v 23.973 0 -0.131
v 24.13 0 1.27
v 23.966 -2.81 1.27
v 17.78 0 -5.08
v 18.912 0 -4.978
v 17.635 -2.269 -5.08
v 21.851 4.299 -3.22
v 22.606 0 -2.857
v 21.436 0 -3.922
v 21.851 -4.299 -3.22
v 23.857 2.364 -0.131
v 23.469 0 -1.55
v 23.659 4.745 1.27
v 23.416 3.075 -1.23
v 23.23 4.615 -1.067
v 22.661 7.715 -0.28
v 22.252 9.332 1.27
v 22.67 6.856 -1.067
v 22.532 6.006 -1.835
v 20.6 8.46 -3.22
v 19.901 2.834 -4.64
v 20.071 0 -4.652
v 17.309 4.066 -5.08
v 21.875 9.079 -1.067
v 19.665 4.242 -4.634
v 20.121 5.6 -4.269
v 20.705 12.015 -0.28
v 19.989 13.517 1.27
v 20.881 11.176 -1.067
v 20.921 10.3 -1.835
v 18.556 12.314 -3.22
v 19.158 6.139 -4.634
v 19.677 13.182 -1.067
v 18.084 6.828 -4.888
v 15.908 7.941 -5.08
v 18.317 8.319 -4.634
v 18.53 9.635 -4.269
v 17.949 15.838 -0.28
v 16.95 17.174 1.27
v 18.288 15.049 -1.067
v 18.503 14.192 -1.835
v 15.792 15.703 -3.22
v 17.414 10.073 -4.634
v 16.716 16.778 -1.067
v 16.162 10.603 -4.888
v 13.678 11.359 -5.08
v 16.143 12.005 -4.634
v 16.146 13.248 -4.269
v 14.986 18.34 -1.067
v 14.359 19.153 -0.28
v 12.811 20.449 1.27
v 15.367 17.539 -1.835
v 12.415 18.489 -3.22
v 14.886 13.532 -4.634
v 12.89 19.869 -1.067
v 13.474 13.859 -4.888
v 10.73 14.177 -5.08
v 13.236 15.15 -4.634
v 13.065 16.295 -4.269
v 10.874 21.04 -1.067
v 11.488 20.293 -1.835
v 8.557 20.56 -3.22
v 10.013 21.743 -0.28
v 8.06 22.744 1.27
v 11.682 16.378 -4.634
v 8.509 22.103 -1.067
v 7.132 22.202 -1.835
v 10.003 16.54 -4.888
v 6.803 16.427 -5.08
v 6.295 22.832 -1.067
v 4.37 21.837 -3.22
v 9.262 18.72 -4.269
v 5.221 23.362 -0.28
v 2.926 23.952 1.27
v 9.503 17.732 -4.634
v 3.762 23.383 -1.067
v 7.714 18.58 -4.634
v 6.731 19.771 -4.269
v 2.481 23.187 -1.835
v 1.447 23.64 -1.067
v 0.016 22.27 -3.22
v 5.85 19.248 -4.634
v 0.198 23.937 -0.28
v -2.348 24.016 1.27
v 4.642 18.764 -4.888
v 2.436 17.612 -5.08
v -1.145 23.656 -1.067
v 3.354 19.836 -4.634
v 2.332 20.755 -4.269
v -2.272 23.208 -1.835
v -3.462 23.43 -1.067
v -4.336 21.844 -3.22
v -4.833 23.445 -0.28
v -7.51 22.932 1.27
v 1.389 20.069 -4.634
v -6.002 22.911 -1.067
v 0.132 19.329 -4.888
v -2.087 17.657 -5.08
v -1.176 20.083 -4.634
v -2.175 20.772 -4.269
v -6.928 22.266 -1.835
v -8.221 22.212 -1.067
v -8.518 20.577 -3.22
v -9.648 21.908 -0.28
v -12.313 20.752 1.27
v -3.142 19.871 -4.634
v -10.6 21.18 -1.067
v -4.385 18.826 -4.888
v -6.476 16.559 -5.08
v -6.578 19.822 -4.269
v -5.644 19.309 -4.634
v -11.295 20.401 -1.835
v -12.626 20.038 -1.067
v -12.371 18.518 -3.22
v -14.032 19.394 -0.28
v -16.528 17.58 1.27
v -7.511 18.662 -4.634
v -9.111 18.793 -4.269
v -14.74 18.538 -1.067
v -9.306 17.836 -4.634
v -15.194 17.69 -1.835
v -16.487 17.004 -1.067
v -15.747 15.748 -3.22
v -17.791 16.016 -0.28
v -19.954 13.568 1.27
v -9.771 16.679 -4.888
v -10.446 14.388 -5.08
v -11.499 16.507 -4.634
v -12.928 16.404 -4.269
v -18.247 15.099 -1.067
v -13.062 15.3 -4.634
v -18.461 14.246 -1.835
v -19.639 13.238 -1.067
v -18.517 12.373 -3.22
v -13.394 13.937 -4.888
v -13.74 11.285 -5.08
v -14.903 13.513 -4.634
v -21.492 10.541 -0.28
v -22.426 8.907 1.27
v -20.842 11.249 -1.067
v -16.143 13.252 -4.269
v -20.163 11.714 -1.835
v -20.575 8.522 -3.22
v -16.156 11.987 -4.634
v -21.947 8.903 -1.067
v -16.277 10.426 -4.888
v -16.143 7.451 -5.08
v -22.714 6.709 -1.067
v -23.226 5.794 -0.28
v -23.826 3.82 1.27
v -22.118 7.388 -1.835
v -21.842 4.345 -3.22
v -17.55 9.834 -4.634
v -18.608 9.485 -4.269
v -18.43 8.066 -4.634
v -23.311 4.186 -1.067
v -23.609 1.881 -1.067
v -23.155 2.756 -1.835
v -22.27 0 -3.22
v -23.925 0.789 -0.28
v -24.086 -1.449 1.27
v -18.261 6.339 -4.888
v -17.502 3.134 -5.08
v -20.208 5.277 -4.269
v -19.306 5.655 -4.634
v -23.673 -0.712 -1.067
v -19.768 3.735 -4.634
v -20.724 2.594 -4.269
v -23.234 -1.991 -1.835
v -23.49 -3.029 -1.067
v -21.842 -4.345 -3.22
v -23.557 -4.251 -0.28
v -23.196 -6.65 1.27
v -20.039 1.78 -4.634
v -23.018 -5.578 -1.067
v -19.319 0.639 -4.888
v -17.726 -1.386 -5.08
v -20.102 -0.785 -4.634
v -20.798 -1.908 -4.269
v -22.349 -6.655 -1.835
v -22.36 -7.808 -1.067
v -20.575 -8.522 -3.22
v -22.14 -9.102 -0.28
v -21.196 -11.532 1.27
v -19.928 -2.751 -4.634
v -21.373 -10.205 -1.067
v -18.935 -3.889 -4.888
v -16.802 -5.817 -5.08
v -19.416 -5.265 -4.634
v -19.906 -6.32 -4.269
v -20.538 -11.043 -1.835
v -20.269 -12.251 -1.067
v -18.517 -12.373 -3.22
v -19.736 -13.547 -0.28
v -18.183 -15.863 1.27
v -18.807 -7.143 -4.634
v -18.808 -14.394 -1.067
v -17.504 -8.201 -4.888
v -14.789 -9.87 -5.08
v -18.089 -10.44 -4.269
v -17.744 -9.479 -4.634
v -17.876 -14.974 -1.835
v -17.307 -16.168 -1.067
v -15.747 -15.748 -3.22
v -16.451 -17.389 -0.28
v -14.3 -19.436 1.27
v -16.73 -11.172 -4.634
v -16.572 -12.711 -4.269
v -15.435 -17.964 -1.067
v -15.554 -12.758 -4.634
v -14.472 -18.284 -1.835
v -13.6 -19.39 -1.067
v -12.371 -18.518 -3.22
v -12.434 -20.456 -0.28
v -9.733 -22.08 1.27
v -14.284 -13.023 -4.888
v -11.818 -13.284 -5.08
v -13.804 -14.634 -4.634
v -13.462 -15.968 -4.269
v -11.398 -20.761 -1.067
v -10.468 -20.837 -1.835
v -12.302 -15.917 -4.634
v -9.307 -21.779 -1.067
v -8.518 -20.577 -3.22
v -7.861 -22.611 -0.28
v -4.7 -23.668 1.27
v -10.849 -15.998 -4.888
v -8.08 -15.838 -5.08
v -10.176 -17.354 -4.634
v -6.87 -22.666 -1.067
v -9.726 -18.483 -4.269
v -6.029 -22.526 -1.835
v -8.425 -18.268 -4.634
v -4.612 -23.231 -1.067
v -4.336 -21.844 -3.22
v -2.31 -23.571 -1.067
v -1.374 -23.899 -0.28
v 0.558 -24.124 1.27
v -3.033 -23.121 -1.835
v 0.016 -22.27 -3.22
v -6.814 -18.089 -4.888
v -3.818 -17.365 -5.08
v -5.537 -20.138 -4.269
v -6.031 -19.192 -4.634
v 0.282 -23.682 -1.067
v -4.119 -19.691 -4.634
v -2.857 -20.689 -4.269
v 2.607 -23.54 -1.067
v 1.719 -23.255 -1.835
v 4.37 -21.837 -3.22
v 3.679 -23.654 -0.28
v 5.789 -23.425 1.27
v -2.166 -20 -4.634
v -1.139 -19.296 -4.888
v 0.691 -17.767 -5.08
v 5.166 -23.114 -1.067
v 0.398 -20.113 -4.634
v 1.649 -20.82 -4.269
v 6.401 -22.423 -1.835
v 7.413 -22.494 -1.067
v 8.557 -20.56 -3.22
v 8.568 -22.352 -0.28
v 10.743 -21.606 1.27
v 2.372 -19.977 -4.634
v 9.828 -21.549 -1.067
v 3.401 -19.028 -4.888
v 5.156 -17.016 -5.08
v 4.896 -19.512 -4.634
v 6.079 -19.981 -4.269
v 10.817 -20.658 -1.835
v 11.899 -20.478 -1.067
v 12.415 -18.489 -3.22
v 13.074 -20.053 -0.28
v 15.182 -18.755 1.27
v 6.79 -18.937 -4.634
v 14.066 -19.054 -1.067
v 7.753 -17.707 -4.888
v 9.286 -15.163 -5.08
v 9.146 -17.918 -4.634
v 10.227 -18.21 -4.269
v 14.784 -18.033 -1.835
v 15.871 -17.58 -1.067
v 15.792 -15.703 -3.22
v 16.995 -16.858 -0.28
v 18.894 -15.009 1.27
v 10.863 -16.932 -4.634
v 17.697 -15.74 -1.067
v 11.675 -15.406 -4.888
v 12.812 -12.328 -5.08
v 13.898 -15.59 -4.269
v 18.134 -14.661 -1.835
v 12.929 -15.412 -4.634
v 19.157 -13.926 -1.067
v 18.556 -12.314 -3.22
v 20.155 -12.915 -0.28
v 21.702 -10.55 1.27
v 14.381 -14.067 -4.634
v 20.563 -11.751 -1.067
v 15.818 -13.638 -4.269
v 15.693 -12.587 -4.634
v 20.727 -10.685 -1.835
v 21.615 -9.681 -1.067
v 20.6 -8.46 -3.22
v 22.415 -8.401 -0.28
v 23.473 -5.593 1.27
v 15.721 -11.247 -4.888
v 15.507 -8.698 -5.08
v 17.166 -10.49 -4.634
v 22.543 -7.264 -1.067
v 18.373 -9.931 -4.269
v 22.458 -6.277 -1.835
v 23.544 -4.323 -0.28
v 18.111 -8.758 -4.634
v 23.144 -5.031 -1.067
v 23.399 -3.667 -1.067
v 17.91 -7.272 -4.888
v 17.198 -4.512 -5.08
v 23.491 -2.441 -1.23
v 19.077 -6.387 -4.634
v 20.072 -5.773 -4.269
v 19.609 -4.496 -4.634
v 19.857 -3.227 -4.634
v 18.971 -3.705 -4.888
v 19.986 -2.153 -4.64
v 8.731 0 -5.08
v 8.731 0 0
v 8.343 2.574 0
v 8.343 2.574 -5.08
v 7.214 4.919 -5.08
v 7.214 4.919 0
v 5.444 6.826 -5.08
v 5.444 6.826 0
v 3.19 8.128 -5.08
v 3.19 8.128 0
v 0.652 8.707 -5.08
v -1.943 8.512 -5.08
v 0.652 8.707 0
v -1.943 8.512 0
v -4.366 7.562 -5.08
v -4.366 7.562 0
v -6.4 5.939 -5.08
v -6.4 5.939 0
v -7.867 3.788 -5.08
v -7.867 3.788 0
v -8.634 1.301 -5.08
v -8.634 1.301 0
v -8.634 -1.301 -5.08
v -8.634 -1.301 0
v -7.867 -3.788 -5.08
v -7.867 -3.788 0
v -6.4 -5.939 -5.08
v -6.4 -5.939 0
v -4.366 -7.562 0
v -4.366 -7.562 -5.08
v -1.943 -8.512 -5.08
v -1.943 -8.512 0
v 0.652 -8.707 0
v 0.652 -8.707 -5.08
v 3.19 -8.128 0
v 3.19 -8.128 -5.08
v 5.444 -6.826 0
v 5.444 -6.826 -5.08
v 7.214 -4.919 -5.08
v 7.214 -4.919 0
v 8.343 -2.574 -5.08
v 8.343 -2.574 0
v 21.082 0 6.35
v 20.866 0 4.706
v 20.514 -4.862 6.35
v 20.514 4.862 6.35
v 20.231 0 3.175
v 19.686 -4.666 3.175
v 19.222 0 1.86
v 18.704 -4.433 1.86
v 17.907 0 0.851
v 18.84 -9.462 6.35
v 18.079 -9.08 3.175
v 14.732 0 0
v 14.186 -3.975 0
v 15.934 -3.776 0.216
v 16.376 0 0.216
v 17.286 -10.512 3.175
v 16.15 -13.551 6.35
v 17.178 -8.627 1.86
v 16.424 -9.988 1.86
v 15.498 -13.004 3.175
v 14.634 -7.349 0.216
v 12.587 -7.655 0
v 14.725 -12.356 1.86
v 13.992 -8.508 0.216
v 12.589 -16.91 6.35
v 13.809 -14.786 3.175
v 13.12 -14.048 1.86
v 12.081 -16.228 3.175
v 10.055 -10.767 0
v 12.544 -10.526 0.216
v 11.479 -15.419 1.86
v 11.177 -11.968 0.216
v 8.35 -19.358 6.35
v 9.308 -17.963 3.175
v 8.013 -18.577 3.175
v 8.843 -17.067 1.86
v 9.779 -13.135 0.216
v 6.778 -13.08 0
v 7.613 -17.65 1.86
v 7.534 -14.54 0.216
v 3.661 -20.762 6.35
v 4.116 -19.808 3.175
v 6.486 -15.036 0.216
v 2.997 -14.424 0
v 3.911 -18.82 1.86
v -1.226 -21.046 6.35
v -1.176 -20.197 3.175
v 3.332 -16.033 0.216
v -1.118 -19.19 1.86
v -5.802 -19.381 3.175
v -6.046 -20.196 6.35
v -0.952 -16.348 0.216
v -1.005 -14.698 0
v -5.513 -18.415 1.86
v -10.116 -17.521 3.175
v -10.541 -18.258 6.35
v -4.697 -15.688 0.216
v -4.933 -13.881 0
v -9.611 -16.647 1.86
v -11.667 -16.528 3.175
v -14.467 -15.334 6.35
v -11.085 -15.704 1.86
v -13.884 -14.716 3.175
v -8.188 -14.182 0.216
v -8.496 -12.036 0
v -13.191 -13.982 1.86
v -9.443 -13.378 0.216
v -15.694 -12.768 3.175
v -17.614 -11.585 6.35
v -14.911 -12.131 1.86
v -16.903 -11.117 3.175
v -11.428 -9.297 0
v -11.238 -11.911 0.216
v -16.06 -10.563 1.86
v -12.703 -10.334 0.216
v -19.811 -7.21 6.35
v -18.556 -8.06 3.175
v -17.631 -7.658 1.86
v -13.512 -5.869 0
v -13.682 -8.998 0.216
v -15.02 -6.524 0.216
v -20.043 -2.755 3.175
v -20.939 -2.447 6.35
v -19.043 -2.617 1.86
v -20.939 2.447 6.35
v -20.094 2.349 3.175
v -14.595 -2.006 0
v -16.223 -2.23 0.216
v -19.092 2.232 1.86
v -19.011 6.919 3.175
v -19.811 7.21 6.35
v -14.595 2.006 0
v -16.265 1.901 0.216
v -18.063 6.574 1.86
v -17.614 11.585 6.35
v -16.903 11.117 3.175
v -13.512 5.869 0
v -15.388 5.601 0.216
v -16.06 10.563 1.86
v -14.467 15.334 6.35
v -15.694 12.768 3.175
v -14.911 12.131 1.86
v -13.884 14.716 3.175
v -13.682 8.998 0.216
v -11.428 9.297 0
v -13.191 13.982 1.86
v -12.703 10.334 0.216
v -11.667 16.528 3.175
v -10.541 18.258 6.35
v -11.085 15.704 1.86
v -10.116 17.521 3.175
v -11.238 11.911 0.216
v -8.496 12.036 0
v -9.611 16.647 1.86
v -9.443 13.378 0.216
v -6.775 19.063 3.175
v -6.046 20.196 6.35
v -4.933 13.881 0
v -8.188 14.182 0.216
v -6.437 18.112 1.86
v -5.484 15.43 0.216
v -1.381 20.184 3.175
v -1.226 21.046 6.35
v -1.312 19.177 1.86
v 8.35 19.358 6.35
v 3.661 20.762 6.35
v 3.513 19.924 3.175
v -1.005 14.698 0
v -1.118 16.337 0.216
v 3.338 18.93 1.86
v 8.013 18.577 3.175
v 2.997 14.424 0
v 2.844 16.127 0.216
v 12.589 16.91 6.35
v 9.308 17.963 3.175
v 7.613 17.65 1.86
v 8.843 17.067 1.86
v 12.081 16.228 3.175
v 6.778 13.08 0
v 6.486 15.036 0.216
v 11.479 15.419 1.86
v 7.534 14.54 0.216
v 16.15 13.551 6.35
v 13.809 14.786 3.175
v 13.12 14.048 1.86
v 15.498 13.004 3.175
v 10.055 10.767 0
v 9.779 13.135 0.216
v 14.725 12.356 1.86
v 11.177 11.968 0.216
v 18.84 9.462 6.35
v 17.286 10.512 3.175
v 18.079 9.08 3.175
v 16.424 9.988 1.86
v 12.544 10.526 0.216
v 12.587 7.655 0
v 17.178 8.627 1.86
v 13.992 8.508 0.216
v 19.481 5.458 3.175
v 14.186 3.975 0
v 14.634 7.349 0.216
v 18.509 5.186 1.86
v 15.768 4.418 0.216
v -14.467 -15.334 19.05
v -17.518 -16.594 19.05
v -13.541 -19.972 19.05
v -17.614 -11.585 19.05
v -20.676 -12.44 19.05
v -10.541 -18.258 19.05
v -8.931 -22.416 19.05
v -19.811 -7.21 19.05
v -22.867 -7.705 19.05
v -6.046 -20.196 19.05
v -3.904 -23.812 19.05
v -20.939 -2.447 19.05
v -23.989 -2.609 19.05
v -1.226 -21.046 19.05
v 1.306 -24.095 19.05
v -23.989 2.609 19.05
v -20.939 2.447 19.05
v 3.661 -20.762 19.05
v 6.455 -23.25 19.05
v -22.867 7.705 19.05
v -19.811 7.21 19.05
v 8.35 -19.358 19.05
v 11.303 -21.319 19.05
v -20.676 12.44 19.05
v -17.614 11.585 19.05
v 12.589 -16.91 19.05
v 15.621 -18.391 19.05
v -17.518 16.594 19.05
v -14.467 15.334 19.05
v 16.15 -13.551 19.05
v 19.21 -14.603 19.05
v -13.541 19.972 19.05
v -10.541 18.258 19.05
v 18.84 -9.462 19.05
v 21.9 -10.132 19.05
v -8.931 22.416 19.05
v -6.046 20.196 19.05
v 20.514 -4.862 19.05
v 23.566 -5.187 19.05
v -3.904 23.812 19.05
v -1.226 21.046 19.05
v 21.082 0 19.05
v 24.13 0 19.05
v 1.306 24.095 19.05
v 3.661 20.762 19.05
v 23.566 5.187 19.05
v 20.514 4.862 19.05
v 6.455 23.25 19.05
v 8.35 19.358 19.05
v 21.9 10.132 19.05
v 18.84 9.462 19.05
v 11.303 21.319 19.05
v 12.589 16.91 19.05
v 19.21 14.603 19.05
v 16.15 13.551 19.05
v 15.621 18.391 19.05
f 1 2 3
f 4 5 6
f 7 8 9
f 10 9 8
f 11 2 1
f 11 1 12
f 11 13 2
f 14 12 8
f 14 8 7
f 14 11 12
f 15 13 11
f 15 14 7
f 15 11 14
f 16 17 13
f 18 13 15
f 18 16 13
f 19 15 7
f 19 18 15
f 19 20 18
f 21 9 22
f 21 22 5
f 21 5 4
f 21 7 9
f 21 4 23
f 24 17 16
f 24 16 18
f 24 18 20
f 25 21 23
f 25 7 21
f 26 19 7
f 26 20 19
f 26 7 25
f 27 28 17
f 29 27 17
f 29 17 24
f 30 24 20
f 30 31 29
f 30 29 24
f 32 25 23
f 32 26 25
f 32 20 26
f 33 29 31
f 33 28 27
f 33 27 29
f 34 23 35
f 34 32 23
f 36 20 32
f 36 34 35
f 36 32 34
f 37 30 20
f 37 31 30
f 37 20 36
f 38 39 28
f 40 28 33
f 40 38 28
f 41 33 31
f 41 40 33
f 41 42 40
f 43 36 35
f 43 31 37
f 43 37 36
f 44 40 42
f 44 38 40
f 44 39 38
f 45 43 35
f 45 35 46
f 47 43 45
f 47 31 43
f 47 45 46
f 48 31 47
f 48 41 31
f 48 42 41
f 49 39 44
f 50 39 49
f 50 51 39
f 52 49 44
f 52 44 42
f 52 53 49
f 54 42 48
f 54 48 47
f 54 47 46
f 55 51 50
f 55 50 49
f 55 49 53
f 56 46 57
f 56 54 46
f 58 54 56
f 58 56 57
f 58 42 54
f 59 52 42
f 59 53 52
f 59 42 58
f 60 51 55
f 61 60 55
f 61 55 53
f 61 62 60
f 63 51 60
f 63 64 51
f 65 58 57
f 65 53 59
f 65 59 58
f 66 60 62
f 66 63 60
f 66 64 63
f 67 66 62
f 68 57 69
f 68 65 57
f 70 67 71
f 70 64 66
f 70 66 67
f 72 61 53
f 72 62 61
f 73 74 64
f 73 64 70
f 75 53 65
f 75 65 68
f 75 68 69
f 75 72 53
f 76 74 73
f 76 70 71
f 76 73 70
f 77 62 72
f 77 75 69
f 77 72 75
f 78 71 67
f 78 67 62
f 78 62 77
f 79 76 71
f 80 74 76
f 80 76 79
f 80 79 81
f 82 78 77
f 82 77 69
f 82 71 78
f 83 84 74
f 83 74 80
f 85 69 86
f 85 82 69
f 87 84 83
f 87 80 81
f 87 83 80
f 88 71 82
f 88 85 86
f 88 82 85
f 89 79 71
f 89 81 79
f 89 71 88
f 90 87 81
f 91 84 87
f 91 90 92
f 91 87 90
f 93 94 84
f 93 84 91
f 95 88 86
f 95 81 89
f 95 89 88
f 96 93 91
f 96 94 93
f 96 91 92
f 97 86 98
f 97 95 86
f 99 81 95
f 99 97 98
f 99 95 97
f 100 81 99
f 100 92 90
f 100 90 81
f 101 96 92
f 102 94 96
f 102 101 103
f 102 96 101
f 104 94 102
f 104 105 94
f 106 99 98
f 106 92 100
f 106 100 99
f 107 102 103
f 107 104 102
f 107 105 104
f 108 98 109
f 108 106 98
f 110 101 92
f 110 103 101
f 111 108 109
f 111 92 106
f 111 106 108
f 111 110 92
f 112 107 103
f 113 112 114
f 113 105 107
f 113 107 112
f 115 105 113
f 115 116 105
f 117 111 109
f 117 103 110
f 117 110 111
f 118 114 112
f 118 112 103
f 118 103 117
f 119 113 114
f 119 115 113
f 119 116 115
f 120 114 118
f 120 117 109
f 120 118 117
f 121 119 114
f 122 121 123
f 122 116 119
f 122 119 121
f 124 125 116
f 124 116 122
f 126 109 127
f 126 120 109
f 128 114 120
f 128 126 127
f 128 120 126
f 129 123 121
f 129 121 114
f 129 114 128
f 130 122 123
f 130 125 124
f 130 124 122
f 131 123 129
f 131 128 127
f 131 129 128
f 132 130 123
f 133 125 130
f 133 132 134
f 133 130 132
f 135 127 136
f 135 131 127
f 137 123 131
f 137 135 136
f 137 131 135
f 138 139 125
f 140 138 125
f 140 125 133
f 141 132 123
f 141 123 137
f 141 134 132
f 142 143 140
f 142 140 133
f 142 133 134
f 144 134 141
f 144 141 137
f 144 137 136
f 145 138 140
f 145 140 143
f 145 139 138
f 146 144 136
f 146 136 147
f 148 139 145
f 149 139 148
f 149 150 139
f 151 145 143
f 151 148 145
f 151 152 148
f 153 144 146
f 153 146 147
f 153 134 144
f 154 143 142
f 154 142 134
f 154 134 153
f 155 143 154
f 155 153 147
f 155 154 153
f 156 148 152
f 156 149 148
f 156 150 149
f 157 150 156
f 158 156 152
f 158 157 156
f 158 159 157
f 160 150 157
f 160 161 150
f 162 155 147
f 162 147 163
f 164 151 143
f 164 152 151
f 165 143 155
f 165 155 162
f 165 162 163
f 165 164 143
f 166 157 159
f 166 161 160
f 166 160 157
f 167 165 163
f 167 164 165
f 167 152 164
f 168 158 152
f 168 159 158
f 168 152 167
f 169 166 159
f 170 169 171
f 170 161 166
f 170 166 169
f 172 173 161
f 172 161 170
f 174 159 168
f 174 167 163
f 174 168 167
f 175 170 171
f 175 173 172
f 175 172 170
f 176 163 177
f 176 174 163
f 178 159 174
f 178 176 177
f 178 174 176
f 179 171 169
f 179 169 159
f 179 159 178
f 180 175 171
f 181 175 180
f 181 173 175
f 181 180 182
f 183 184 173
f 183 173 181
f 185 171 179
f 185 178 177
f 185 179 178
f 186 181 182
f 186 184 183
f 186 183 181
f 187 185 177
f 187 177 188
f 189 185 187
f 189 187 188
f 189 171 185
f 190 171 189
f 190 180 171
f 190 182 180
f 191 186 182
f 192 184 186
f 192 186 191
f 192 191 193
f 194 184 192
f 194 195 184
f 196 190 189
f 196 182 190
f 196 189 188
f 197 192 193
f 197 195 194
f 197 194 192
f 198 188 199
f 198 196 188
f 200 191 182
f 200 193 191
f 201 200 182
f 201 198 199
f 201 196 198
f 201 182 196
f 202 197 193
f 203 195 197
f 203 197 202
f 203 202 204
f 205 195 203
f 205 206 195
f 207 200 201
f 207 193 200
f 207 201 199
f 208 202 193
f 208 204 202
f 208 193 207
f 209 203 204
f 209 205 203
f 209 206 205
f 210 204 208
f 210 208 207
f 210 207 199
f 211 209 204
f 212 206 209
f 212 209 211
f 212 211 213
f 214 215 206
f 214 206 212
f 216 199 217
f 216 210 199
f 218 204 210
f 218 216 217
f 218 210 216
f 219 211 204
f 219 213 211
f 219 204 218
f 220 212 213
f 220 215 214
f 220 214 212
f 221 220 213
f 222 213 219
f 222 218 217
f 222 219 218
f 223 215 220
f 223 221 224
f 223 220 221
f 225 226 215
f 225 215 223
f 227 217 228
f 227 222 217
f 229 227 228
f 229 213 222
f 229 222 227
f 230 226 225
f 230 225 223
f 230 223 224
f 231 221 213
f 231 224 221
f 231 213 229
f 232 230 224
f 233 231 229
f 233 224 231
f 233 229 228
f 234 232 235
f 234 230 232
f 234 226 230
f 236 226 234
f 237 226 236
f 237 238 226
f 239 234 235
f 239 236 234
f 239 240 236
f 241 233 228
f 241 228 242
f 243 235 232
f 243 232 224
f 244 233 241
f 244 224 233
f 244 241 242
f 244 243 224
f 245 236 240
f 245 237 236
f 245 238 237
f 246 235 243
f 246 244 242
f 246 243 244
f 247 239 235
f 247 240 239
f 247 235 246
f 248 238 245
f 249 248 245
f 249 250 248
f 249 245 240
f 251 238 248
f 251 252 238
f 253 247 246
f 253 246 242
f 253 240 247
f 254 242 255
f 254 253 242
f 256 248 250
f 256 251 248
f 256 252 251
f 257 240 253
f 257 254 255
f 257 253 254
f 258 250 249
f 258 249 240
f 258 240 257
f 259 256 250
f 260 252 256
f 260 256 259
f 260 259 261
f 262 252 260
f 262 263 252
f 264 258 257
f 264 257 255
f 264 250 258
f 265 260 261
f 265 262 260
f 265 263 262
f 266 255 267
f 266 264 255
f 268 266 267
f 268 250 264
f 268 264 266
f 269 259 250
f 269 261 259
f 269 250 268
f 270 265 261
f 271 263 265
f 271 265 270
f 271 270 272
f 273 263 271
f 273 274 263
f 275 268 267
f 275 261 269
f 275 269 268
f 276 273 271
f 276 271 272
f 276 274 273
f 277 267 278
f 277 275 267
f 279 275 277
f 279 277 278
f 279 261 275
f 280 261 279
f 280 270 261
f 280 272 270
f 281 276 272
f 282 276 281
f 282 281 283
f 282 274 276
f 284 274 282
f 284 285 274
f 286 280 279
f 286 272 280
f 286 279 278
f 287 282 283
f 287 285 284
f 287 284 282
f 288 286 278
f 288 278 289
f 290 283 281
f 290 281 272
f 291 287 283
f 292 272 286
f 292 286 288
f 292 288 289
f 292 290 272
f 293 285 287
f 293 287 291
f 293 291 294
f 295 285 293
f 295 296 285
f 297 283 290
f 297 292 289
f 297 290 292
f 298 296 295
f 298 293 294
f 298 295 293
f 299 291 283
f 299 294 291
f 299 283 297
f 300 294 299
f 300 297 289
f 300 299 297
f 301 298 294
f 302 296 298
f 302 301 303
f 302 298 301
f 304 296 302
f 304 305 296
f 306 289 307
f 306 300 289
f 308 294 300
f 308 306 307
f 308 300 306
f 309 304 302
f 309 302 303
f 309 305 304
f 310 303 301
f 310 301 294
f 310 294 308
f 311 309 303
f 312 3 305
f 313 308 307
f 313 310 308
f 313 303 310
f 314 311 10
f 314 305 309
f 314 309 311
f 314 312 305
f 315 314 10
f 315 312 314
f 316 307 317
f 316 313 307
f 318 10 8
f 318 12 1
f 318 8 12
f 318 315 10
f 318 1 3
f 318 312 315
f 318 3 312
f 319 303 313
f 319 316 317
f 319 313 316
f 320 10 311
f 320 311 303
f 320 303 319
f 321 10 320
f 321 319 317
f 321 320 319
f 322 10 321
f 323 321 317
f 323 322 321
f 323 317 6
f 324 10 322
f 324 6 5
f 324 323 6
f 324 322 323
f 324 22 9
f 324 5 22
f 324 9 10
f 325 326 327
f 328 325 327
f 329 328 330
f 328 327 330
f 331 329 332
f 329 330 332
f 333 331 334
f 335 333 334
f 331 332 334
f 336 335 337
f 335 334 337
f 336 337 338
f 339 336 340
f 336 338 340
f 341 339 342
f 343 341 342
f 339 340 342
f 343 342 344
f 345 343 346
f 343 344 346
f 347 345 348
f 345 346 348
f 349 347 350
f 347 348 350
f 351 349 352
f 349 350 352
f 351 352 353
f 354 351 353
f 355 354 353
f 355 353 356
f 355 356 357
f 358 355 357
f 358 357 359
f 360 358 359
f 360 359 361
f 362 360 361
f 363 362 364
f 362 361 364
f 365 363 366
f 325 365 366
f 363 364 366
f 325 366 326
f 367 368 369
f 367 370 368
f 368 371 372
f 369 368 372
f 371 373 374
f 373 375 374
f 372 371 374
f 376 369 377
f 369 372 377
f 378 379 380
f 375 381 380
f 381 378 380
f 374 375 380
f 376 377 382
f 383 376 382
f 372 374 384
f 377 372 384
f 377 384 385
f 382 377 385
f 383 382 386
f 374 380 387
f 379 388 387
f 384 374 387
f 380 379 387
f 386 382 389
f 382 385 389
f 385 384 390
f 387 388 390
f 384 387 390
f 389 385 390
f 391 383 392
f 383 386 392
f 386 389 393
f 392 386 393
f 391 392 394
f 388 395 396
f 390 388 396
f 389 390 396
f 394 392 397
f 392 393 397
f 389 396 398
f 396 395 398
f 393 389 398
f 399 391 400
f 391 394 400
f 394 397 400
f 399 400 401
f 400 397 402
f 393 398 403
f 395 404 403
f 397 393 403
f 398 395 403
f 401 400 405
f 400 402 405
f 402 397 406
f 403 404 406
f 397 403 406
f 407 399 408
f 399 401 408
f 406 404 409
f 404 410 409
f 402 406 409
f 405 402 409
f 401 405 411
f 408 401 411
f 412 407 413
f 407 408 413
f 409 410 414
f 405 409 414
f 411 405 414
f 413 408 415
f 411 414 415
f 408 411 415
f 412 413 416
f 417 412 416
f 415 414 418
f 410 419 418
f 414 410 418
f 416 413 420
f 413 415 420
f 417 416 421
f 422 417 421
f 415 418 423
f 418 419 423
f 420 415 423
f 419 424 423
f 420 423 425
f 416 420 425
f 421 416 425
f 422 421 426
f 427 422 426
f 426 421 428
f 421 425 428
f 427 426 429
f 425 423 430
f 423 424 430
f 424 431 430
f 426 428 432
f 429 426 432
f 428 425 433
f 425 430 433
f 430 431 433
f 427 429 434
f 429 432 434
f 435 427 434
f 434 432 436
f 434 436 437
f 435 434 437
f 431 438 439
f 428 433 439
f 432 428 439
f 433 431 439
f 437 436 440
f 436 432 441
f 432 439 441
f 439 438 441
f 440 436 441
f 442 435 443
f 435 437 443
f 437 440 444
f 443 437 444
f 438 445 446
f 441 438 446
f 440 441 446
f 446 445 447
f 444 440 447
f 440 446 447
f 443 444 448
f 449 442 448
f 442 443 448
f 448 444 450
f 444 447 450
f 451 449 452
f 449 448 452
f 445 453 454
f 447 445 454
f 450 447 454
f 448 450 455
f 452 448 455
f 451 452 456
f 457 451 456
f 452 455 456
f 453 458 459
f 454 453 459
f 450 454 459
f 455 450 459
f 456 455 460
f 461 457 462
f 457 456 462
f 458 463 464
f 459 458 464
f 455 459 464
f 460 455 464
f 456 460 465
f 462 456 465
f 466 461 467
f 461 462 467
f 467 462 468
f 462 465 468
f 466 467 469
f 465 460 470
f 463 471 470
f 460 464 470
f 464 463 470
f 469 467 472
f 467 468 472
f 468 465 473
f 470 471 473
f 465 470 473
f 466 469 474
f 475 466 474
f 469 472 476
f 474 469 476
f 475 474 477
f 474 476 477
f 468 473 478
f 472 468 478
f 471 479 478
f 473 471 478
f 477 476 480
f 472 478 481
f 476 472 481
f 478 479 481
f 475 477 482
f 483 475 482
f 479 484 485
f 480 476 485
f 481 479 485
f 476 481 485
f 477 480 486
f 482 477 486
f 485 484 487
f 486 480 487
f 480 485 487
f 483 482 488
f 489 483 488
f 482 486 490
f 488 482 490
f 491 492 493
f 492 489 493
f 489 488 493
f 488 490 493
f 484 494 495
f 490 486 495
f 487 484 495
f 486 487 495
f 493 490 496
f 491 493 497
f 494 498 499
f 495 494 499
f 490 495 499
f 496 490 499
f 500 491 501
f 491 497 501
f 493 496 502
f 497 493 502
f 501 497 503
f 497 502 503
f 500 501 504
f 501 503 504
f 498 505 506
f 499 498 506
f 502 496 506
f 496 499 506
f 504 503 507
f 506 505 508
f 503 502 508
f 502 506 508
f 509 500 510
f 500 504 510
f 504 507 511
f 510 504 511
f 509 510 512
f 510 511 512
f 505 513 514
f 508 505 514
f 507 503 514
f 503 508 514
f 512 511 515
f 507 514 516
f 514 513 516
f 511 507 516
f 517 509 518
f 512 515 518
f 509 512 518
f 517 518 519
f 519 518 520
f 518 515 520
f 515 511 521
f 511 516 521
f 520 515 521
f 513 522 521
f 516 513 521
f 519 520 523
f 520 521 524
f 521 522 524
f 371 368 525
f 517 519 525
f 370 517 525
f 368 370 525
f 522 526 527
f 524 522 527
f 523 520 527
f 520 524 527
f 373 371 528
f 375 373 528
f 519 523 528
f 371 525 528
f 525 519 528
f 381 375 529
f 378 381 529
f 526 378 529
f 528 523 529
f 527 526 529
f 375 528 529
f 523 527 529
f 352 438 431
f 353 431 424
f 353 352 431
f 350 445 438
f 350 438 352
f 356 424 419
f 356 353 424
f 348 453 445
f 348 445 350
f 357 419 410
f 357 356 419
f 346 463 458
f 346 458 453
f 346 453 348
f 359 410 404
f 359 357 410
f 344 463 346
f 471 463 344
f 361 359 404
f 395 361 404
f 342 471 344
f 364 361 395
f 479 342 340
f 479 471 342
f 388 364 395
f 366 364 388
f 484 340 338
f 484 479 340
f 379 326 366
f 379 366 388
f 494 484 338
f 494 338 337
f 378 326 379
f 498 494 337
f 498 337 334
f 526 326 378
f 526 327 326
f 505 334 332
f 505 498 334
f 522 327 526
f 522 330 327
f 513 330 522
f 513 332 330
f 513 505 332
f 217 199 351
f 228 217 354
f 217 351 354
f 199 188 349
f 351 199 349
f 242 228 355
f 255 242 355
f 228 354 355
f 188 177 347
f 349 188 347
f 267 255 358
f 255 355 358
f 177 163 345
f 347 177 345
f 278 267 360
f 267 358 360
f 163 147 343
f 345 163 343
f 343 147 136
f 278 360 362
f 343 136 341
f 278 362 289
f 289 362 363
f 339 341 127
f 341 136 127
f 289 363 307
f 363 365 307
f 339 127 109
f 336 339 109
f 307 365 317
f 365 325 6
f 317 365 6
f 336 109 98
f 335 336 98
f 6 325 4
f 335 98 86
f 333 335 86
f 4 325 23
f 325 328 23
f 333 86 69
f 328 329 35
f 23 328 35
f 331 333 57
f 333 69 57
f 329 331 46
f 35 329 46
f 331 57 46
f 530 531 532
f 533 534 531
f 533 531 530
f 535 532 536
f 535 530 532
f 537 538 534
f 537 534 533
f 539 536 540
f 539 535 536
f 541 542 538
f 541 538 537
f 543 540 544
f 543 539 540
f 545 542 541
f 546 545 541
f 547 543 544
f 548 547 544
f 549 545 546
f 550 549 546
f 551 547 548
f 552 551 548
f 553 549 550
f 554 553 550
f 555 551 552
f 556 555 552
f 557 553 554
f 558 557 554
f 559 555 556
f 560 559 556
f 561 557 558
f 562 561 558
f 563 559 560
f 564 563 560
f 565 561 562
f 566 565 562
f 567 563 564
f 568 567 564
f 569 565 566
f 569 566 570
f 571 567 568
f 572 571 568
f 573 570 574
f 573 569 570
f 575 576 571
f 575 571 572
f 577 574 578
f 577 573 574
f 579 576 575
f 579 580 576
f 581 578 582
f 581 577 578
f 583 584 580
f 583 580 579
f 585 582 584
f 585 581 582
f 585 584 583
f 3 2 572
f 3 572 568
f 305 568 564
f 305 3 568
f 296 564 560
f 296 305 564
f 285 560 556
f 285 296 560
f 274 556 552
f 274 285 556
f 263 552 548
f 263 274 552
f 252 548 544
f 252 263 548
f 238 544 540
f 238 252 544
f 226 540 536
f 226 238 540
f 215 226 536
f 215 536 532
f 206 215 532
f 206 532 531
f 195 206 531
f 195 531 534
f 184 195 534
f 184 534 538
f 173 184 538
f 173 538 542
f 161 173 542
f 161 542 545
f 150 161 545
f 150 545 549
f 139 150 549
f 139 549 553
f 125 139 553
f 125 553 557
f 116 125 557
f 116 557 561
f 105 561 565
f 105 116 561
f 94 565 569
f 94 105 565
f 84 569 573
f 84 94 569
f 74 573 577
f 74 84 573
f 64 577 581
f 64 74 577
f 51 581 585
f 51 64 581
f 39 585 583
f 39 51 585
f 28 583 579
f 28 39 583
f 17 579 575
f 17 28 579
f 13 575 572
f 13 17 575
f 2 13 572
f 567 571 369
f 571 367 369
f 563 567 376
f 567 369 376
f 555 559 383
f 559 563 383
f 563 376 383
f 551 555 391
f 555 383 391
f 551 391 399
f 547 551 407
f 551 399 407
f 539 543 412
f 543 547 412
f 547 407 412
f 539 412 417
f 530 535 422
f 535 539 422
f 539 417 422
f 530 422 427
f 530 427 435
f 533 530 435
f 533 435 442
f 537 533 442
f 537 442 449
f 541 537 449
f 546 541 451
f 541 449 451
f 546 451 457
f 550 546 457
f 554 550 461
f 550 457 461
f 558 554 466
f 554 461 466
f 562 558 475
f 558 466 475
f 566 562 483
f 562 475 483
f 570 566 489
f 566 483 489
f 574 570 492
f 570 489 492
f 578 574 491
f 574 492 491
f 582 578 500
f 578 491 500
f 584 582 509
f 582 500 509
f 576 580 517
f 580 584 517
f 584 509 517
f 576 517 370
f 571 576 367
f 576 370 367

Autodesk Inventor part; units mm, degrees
ref_plane "YZ Plane" through (0, 0, 0) normal (1, 0, 0) x (0, 1, 0)
ref_plane "XZ Plane" through (0, 0, 0) normal (0, 1, 0) x (-1, 0, 0)
ref_plane "XY Plane" through (0, 0, 0) normal (0, 0, 1) x (1, 0, 0)
sketch "Sketch1" plane through (0, 0, 0) normal (0, 0, 1) x (1, 0, 0)
  circle A0 centre (0, 0) radius 21.082
  circle A1 centre (0, 0) radius 24.13
  circle A2 centre (0, 0) radius 8.7313
  dimension "d0" = 42.164
  dimension "d1" = 48.26
  dimension "d8" = 17.4625
extrude "Extrusion1" add sketch "Sketch1" along normal blind 19.05 contours A1
extrude "Extrusion2" add sketch "Sketch1" against normal blind 5.08 contours A0 | A1 | A2
fillet "Fillet1" radius 6.35 1 edges at (-24.13, 0, -5.08)
fillet "Fillet2" radius 6.35 1 edges at (-21.082, 0, 0)
extrude "Extrusion3" cut sketch "Sketch1" against normal blind 5.08 contours A2
properties part number "PVC Shooter Conveyor End Cap" material "PVC-Piping"
